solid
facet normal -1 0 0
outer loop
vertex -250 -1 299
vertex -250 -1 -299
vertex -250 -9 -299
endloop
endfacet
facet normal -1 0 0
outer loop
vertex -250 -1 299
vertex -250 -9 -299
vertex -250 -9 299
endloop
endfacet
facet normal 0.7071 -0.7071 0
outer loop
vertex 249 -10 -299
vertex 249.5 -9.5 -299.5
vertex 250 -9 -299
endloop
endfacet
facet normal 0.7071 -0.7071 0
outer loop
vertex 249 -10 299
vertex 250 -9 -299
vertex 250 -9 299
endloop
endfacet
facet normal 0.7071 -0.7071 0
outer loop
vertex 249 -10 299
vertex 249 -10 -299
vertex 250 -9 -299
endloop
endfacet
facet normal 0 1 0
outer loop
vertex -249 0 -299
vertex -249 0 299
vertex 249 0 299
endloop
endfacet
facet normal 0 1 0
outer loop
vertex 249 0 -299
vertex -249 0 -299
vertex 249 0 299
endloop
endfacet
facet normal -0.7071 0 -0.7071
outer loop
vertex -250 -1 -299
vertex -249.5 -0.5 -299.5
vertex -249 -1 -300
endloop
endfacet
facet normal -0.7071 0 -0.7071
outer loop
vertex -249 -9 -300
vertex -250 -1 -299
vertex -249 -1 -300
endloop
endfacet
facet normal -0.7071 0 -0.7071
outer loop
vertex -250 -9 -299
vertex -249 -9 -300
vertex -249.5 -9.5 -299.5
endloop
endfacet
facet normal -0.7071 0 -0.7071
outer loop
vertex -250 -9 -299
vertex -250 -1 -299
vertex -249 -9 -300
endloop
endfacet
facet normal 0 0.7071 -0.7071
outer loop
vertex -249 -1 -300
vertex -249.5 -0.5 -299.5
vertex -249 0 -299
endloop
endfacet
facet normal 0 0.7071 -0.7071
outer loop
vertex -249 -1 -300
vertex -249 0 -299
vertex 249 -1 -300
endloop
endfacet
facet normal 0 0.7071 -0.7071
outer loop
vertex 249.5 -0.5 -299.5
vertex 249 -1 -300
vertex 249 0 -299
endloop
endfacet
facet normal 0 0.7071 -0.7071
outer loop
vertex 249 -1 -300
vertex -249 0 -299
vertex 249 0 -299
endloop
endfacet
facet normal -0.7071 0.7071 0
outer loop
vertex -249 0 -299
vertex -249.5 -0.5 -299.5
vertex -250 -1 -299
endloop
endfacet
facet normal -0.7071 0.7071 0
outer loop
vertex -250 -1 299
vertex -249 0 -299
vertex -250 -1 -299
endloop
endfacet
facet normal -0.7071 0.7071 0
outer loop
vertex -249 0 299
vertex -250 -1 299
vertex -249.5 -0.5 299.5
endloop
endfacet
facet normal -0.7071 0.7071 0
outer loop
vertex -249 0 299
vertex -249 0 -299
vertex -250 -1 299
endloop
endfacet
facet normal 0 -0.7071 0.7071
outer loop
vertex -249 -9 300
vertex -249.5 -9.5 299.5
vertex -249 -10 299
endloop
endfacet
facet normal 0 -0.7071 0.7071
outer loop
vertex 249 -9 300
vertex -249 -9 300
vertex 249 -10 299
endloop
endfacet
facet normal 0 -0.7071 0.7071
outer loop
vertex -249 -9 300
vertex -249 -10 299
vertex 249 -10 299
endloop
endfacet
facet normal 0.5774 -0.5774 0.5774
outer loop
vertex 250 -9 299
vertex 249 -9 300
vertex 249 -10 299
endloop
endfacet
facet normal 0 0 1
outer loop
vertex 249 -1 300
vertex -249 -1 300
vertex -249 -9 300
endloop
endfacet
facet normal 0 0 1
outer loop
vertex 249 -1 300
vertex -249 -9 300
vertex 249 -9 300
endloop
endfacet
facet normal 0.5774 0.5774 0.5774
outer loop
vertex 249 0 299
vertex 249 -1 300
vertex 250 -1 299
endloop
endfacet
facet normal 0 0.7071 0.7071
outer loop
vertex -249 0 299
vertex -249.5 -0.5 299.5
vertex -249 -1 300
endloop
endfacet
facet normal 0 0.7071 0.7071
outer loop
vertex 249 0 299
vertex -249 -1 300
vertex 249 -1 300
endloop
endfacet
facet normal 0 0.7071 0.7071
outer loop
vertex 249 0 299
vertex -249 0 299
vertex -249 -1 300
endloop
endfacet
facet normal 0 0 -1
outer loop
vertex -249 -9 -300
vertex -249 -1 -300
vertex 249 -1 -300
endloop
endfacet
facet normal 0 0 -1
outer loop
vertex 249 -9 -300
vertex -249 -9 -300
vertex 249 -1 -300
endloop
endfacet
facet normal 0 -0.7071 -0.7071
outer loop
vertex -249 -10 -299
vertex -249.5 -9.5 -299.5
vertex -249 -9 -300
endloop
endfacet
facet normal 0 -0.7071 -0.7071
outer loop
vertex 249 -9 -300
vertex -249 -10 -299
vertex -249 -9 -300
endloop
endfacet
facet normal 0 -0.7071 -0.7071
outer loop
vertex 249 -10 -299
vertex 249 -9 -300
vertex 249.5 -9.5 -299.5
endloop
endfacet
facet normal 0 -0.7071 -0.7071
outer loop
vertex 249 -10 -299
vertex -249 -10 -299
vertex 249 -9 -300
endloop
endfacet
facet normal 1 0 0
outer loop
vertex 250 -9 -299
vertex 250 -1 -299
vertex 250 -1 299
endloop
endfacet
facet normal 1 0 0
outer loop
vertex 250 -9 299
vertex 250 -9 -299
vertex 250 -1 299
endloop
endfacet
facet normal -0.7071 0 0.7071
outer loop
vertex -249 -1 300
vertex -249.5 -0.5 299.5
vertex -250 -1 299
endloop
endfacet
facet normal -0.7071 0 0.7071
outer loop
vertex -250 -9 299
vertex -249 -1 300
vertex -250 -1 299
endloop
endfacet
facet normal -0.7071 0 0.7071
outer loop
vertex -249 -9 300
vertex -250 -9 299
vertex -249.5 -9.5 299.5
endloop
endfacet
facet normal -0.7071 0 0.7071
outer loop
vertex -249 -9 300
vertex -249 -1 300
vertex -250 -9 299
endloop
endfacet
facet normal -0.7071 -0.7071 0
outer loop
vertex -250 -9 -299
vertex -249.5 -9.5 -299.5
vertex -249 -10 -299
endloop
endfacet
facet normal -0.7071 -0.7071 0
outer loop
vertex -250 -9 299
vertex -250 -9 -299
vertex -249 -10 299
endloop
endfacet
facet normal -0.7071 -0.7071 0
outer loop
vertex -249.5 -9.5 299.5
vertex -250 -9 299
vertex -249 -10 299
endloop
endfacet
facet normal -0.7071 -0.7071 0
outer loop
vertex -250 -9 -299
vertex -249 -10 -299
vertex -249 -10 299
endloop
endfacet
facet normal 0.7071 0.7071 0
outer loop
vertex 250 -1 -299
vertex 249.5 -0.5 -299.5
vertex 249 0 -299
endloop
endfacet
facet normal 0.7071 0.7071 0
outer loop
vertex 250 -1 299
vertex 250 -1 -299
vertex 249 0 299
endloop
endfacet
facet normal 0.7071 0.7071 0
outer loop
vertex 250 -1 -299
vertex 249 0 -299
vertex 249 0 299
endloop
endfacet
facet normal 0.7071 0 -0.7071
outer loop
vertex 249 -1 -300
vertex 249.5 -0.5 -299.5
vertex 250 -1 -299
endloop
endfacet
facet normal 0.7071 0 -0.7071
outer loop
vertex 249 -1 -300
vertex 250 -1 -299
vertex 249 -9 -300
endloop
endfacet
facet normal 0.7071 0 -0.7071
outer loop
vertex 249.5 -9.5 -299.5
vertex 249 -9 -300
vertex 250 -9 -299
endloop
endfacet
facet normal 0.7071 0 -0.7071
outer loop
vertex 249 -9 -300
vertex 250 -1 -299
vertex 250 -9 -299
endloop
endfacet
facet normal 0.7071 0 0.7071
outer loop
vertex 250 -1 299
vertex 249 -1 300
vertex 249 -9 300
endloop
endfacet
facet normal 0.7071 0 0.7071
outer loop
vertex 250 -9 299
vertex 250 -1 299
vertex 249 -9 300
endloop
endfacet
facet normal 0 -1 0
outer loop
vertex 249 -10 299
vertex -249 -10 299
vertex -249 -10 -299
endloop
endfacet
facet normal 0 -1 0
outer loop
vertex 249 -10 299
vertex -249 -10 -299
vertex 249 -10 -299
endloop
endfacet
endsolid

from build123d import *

# Parameters (mm, degrees)
F0_W     = 500
F0_H     = 600
F1_DEPTH = 10
F2_SIZE  = 1
F3_SIZE  = 1
F4_SIZE  = 1


with BuildPart() as f1:
    # F0 (on Front) → F1 (new body)
    with BuildSketch(Plane.XZ):
        Rectangle(F0_W, F0_H)
    extrude(amount=F1_DEPTH)

    # F2
    f2_edges = [f1.edges().sort_by_distance(p)[0] for p in [
        (0, -10, 300),
        (0, 0, 300),
        (250, -5, 300),
        (250, 0, 0),
        (250, -10, 0),
    ]]
    chamfer(f2_edges, length=F2_SIZE)

    # F3 (call 1 of 3: OpenCascade refuses the feature's edges together)
    f3_edges = [f1.edges().sort_by_distance(p)[0] for p in [
        (-250, -5, 300),
    ]]
    chamfer(f3_edges, length=F3_SIZE)

    # F3#2 (call 2 of 3)
    f3_2_edges = [f1.edges().sort_by_distance(p)[0] for p in [
        (-250, -10, -0.5),
    ]]
    chamfer(f3_2_edges, length=F3_SIZE)

    # F3#3 (call 3 of 3)
    f3_3_edges = [f1.edges().sort_by_distance(p)[0] for p in [
        (-250, 0, -0.5),
    ]]
    chamfer(f3_3_edges, length=F3_SIZE)

    # F4 (call 1 of 4: OpenCascade refuses the feature's edges together)
    f4_edges = [f1.edges().sort_by_distance(p)[0] for p in [
        (250, -5, -300),
    ]]
    chamfer(f4_edges, length=F4_SIZE)

    # F4#2 (call 2 of 4)
    f4_2_edges = [f1.edges().sort_by_distance(p)[0] for p in [
        (0, -10, -300),
    ]]
    chamfer(f4_2_edges, length=F4_SIZE)

    # F4#3 (call 3 of 4)
    f4_3_edges = [f1.edges().sort_by_distance(p)[0] for p in [
        (0, 0, -300),
    ]]
    chamfer(f4_3_edges, length=F4_SIZE)

    # F4#4 (call 4 of 4)
    f4_4_edges = [f1.edges().sort_by_distance(p)[0] for p in [
        (-250, -5, -300),
    ]]
    chamfer(f4_4_edges, length=F4_SIZE)


solid = f1.part
